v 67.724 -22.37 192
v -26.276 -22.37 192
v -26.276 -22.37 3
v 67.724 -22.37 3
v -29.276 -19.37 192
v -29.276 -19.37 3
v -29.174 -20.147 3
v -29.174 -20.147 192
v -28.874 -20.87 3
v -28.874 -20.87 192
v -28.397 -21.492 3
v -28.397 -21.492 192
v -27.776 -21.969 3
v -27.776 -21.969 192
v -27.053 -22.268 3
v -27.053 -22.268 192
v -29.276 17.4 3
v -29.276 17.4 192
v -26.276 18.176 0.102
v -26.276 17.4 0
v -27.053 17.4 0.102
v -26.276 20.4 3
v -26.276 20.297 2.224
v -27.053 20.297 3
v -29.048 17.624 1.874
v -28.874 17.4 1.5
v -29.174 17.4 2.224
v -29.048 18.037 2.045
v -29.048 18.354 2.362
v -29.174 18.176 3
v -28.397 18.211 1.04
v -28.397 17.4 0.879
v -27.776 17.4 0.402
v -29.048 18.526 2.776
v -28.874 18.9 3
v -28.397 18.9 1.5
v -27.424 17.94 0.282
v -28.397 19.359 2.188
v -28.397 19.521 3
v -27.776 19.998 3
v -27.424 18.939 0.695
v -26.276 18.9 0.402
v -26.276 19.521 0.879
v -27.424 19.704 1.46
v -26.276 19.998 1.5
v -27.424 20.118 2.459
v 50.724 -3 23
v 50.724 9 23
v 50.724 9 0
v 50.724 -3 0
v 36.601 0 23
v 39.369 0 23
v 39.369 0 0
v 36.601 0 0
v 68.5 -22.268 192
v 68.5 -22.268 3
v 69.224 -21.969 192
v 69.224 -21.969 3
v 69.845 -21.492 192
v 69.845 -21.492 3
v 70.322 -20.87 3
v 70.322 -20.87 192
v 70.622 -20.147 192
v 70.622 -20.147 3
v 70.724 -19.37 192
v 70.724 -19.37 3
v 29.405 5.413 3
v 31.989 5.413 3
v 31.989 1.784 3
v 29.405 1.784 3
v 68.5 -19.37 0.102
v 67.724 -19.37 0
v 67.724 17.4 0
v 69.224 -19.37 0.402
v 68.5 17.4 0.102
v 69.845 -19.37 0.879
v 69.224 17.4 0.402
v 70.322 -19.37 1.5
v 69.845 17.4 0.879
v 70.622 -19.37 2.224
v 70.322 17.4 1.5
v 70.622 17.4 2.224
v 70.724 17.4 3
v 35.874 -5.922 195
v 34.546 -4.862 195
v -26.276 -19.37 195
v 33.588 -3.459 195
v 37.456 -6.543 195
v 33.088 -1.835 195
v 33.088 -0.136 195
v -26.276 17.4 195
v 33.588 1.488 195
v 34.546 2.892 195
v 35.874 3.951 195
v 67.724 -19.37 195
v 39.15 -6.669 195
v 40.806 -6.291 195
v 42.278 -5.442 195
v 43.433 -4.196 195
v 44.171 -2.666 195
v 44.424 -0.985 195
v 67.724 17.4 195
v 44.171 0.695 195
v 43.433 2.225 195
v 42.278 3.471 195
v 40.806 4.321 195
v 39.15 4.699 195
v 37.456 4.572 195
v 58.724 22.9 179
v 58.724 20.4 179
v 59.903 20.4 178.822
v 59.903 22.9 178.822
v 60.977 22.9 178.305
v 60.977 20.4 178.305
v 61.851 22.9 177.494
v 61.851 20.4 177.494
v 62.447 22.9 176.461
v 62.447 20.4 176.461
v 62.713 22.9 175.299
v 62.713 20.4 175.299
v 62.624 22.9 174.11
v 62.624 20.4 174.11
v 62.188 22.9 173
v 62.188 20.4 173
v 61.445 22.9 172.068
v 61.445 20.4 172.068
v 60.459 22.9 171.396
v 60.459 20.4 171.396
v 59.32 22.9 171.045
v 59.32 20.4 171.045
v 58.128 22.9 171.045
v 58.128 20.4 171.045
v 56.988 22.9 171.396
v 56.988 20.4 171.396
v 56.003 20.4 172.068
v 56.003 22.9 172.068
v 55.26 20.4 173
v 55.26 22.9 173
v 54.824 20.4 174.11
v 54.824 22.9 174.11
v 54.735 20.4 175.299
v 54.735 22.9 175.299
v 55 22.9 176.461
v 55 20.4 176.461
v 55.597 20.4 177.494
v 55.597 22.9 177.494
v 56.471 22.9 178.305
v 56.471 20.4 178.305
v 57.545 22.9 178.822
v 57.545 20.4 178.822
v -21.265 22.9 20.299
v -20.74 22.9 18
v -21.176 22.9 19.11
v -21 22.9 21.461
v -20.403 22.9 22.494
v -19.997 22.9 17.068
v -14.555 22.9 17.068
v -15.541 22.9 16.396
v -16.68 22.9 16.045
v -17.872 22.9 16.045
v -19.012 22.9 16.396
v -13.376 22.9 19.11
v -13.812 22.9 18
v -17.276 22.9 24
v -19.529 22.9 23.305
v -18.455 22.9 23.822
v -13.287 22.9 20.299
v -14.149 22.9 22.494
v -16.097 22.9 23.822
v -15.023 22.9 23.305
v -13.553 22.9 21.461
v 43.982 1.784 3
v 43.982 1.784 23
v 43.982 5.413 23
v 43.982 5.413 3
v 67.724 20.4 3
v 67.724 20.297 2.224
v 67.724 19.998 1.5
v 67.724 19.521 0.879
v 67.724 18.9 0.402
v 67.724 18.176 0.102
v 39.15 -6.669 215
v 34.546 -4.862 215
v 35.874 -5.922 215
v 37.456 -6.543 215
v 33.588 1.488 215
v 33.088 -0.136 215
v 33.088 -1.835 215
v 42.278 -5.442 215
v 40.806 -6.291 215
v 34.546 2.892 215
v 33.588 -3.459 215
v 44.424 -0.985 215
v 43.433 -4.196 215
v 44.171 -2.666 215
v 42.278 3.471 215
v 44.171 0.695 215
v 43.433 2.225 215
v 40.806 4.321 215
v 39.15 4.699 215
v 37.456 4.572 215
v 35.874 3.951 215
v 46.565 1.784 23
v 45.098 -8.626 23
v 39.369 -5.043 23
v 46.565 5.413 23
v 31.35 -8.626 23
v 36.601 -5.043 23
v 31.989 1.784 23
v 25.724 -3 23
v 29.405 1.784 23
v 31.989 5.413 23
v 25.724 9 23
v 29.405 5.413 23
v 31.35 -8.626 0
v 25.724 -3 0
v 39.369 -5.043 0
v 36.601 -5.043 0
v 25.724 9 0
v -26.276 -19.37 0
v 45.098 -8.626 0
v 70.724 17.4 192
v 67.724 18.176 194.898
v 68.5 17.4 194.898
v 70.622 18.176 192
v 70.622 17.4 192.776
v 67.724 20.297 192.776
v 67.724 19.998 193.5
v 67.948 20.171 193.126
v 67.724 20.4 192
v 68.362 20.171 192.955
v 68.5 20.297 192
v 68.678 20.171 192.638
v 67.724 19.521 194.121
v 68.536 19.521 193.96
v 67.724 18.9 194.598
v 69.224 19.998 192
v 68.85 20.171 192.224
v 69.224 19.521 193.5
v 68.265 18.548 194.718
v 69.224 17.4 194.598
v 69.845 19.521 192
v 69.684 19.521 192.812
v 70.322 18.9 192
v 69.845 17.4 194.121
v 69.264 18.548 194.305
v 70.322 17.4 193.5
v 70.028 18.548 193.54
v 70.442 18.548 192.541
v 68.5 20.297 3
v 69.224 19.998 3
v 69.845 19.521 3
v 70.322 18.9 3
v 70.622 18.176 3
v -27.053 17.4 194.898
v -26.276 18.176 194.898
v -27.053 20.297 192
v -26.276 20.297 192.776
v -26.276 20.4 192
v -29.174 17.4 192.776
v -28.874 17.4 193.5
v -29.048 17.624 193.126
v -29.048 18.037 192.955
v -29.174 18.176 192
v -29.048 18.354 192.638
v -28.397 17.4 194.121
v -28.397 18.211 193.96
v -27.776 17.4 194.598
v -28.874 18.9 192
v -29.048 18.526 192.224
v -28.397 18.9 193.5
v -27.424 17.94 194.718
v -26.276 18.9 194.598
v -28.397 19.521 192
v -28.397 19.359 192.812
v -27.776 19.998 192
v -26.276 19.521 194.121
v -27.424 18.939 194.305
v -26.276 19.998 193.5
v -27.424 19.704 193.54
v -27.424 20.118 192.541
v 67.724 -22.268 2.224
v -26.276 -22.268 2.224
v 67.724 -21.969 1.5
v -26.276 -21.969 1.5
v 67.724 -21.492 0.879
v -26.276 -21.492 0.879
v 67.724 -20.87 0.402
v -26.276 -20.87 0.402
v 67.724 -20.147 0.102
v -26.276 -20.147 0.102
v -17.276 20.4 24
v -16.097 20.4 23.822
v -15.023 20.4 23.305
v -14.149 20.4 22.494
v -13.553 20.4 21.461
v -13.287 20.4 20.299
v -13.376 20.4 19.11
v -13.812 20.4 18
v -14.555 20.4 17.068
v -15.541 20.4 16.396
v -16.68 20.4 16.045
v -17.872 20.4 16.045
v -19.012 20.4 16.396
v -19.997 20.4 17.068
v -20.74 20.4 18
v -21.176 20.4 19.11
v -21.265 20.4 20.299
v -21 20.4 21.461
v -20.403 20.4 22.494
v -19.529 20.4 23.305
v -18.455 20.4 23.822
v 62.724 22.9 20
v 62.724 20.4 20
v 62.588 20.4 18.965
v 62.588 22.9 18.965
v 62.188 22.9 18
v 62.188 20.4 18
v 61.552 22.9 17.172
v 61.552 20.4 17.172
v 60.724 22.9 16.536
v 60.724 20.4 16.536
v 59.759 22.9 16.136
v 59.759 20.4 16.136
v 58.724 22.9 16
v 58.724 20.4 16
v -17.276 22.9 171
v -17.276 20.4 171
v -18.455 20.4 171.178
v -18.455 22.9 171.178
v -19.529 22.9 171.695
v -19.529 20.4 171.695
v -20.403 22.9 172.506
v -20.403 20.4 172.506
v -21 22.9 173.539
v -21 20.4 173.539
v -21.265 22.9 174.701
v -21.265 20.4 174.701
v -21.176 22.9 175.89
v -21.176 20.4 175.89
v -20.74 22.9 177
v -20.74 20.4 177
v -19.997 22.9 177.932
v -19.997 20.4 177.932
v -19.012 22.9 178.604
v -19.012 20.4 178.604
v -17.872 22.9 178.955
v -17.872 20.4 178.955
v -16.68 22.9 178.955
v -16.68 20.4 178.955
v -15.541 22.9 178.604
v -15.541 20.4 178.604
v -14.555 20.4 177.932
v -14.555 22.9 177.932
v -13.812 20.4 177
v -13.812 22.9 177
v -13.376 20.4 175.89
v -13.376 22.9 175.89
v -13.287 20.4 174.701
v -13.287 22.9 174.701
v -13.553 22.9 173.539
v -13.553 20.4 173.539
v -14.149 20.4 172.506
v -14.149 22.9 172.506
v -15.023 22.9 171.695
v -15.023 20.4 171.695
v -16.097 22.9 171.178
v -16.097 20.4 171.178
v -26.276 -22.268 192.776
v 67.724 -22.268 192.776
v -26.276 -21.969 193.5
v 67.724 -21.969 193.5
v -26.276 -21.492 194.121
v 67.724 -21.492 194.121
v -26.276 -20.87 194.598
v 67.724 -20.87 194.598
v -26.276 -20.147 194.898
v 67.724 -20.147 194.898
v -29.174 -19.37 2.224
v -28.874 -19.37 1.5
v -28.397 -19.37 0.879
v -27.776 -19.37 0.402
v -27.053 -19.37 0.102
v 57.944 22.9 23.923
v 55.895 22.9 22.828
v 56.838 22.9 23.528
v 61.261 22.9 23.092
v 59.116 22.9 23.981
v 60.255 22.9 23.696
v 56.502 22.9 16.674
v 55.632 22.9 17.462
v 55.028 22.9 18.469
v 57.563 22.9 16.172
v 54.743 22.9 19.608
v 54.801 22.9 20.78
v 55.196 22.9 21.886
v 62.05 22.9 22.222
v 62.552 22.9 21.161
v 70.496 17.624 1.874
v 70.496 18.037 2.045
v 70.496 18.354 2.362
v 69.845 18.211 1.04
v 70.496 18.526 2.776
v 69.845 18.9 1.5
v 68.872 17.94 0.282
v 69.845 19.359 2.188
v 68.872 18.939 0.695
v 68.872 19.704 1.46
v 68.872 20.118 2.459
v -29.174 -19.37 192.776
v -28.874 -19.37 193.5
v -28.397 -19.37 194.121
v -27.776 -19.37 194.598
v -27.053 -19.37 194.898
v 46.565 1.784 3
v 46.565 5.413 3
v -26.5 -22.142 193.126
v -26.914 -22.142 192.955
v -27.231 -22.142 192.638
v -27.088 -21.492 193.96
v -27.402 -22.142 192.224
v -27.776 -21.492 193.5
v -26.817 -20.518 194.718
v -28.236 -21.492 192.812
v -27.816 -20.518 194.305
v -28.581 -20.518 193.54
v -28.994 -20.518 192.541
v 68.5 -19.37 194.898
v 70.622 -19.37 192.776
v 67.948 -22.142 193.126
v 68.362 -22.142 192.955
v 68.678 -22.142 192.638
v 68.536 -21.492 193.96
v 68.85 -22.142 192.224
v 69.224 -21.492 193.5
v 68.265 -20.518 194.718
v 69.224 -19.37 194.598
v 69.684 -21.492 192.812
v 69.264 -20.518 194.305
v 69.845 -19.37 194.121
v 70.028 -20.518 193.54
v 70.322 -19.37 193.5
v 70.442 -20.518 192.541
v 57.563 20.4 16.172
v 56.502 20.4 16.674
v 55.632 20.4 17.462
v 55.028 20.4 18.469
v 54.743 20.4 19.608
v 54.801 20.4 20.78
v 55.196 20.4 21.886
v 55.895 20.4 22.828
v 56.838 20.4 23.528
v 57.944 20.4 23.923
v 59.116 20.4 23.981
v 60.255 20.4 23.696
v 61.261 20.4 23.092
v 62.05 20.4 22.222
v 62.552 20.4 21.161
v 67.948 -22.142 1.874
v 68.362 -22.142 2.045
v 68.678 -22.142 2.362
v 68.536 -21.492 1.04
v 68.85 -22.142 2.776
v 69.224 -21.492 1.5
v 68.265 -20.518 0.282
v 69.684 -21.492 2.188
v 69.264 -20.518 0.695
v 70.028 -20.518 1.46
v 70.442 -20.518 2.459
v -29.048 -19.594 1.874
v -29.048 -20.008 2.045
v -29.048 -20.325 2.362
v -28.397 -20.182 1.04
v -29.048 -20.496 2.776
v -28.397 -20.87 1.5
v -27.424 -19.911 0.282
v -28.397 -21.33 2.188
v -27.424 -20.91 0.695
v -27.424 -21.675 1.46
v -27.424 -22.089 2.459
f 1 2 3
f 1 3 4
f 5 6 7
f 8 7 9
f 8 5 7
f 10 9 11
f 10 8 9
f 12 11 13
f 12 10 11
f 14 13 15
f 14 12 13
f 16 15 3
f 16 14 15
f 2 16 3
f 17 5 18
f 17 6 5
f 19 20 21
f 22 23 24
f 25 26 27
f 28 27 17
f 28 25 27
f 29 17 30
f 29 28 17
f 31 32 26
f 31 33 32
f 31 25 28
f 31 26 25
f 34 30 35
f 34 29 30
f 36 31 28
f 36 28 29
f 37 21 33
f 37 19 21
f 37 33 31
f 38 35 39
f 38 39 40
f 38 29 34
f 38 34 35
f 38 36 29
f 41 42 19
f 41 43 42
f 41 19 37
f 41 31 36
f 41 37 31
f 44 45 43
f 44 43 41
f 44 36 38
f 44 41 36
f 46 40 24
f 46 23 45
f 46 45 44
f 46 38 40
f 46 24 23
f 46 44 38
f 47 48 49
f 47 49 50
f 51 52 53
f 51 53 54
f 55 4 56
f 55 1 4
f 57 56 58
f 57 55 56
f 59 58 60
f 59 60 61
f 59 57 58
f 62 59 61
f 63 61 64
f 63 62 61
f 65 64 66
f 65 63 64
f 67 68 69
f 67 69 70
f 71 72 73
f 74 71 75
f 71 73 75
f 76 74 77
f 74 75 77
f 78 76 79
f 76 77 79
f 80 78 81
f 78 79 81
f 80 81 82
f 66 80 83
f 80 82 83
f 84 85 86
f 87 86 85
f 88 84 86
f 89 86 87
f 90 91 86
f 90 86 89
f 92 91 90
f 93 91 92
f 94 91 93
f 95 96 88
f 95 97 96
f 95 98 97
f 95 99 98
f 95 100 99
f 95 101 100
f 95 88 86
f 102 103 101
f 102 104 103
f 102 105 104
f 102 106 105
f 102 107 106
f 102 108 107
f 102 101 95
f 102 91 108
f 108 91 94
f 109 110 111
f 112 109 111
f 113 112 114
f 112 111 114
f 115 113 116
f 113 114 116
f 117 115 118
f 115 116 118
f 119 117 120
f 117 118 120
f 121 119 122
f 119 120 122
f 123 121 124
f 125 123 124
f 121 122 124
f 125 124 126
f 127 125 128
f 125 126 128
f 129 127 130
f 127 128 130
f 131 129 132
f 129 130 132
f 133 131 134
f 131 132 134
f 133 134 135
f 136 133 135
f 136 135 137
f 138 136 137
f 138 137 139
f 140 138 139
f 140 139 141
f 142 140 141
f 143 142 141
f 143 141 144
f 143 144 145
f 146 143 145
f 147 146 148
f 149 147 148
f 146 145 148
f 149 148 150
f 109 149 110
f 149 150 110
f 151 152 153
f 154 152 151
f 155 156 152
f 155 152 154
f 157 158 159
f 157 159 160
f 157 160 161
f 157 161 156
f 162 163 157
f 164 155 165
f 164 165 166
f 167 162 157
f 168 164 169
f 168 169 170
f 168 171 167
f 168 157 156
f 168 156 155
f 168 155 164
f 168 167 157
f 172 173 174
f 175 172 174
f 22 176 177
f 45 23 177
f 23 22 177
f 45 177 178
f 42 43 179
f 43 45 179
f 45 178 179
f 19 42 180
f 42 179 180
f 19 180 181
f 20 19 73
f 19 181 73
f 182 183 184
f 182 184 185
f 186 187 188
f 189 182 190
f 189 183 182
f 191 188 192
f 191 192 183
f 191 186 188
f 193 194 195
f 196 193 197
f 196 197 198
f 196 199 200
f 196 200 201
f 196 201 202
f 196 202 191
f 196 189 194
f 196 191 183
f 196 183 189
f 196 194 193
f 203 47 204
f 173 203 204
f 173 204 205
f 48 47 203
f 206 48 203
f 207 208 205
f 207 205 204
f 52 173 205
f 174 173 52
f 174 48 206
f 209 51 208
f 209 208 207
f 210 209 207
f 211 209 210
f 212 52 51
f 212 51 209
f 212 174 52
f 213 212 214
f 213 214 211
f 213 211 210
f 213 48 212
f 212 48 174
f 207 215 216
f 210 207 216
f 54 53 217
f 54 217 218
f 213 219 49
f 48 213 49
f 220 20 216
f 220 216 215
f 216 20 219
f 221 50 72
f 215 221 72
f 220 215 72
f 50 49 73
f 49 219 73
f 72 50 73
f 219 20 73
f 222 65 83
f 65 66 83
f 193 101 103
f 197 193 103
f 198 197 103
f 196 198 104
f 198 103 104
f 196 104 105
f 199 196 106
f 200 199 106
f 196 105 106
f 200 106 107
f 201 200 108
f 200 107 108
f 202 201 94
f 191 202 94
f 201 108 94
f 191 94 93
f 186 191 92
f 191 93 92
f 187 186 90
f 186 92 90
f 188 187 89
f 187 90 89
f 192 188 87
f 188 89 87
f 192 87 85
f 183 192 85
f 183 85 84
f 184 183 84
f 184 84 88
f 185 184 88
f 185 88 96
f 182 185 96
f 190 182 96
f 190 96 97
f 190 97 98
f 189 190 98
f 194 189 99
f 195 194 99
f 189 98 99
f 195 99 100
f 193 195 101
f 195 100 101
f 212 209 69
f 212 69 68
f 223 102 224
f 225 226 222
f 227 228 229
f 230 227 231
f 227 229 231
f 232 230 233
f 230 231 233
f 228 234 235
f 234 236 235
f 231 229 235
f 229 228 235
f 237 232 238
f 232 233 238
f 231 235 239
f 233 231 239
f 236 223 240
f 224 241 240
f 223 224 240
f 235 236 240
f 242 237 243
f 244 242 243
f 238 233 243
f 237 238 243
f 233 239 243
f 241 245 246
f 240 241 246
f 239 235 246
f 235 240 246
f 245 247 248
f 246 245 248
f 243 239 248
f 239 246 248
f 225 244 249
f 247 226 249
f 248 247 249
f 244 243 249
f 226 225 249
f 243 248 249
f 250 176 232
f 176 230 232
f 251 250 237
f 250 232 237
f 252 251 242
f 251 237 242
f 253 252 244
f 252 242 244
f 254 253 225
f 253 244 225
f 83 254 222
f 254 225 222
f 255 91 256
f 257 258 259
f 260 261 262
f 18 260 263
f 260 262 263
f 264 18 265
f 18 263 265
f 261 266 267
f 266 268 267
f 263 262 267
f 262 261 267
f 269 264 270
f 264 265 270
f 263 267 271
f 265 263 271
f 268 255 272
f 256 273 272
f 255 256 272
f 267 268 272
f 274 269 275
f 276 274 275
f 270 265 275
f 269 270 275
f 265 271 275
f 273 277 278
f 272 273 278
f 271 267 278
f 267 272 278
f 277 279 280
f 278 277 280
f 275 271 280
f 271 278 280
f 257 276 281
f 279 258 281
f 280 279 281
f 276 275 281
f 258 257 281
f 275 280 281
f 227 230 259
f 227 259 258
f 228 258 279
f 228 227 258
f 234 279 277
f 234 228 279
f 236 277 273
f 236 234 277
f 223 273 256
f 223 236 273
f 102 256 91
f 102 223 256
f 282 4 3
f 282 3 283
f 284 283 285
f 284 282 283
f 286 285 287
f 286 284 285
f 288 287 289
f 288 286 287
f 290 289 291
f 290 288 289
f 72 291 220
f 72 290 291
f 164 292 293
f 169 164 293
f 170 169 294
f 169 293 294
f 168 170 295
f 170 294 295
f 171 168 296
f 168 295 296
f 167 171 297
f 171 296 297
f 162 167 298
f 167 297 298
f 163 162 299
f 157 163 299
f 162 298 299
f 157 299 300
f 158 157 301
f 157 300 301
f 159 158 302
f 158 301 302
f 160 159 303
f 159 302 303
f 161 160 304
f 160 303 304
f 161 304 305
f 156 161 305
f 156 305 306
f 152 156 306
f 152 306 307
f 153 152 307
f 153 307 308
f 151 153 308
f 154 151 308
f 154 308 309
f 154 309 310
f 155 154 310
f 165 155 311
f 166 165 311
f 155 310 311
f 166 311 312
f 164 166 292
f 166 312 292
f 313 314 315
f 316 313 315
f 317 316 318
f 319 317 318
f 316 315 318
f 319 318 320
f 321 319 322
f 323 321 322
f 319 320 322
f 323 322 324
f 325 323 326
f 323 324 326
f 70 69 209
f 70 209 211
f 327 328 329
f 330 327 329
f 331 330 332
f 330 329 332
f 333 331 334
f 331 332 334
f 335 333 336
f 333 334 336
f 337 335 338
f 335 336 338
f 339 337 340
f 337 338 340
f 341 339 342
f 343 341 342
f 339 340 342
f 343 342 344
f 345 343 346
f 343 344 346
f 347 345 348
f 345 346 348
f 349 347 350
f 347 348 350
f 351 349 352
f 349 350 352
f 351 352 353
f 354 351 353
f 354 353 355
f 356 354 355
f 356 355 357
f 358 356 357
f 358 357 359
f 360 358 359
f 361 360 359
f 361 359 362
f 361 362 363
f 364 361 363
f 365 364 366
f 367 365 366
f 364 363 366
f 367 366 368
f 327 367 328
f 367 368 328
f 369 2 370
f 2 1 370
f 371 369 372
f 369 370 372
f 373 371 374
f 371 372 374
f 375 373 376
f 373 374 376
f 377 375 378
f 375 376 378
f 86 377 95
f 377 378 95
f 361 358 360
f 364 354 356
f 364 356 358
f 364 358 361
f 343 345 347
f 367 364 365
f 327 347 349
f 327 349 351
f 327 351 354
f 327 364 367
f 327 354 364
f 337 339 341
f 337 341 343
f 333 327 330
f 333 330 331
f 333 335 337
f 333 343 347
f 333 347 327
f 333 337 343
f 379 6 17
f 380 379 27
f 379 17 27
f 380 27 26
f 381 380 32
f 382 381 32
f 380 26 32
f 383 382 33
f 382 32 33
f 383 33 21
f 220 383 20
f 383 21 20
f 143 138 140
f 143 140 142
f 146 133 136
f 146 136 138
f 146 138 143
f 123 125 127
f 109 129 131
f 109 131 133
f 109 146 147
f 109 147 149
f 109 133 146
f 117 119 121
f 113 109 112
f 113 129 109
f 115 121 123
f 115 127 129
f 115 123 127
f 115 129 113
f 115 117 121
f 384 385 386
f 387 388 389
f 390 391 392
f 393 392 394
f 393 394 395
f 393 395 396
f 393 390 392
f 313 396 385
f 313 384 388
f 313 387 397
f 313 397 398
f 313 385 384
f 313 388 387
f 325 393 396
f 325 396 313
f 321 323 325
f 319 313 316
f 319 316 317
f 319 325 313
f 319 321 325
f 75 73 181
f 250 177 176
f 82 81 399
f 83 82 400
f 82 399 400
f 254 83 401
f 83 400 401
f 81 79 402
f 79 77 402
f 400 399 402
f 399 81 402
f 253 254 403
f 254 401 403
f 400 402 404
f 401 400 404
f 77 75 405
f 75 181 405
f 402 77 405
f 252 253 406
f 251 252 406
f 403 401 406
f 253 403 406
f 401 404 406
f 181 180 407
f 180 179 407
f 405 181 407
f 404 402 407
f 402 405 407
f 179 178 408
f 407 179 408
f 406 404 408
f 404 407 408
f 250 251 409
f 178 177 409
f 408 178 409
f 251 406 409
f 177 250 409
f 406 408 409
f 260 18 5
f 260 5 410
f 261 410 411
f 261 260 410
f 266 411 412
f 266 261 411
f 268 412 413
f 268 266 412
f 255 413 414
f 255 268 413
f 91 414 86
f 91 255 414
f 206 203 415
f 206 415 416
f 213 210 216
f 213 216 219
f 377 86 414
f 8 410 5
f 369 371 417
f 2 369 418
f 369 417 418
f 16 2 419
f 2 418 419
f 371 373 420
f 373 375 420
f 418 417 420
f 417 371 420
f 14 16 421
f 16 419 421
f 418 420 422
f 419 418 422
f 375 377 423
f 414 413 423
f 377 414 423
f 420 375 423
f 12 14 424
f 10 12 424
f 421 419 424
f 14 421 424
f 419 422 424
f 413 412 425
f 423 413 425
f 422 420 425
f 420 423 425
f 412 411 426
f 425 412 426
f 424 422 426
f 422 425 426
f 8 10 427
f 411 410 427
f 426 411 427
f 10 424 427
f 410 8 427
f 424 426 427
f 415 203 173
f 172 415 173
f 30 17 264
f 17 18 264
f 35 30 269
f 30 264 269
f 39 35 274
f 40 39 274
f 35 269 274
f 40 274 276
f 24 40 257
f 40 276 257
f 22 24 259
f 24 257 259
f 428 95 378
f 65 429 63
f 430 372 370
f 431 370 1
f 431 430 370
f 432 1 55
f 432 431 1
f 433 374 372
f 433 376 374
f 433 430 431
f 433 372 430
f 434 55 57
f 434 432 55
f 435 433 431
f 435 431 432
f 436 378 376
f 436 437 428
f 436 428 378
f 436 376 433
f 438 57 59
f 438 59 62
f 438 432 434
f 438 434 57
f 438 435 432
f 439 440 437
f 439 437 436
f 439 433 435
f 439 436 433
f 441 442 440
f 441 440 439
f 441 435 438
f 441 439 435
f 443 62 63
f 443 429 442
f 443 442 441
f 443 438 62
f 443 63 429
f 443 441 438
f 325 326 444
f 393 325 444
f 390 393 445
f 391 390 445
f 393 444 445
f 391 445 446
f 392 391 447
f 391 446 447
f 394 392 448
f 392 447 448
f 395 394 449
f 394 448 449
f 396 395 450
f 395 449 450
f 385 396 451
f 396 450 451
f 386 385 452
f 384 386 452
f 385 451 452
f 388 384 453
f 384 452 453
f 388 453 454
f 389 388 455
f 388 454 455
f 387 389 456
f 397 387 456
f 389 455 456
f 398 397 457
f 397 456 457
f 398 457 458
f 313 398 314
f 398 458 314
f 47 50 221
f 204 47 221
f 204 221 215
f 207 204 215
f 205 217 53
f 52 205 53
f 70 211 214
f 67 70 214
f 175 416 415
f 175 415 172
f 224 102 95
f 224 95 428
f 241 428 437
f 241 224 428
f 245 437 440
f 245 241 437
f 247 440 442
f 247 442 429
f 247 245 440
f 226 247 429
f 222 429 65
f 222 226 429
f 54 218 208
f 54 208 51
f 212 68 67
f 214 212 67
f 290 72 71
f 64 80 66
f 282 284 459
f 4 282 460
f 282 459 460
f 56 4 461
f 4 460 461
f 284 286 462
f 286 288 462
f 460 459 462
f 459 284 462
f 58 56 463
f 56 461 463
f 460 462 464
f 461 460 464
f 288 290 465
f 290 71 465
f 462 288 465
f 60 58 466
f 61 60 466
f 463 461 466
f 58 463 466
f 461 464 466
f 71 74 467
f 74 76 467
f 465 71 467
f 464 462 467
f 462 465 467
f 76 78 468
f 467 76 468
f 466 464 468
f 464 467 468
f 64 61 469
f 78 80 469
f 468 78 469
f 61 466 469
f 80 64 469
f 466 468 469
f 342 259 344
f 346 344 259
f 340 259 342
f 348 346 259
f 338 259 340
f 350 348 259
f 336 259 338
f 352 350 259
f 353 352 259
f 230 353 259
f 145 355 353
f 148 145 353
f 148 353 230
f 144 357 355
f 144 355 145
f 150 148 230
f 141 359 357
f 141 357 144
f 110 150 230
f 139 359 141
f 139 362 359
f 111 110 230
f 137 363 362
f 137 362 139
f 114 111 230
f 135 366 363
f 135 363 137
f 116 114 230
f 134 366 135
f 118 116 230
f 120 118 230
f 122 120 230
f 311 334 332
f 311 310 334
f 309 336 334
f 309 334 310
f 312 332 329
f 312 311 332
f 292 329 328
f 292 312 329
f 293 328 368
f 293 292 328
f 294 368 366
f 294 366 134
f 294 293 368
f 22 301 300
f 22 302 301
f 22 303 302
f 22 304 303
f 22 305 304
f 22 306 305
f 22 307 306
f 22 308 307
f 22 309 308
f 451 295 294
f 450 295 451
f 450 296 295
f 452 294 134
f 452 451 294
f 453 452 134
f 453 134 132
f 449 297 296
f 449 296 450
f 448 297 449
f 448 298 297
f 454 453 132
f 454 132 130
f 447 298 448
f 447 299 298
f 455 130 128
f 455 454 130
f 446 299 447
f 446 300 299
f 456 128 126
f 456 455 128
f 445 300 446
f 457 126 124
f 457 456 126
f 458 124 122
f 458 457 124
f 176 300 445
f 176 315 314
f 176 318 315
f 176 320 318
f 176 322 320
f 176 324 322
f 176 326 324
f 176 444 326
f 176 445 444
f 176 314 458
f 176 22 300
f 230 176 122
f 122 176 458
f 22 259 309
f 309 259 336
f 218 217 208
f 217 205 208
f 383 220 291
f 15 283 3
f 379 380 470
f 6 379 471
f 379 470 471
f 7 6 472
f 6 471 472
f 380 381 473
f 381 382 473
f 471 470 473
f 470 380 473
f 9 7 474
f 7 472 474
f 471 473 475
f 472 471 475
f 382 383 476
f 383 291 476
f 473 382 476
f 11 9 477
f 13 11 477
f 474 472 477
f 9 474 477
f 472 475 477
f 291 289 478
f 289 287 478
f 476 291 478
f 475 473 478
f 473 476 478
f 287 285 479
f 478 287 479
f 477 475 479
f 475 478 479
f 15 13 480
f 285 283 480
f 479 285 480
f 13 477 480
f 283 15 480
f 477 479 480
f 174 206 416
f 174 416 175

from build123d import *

# Parameters (mm, degrees)
SKETCH1_W           = 100
SKETCH1_H           = 42.77
BOSS_EXTRUDE1_DEPTH = 195
SKETCH2_R           = 4
BOSS_EXTRUDE2_DEPTH = 2.5
FILLET1_R           = 3
SKETCH3_R           = 5.7
BOSS_EXTRUDE3_DEPTH = 20
CUT_EXTRUDE1_DEPTH  = 23
SKETCH5_W           = 2.767644168
SKETCH5_H           = 5.042715582
SKETCH5_W_2         = 2.583134557
SKETCH5_H_2         = 3.628689021
BOSS_EXTRUDE4_DEPTH = 20
SKETCH6_W           = 2.767644168
SKETCH6_H           = 5.042715582
BOSS_EXTRUDE5_DEPTH = 3


with BuildPart() as part:
    # Sketch1 → Boss-Extrude1 (new body)
    with BuildSketch(Plane.XY):
        with Locations((20.723910559, -0.985431434)):
            Rectangle(SKETCH1_W, SKETCH1_H)
    extrude(amount=BOSS_EXTRUDE1_DEPTH)

    # Sketch2 → Boss-Extrude2 (add)
    with BuildSketch(Plane(origin=(0, 20.399568566, 0), x_dir=(1, 0, 0), z_dir=(0, 1, 0))):
        with BuildLine():
            ThreePointArc((62.723910559, -20), (61.552337684, -17.171572875), (58.723910559, -16))
            Line((58.723910559, -16), (58.723910559, -20))
            Line((58.723910559, -20), (62.723910559, -20))
        make_face()
        with BuildLine():
            Line((58.723910559, -20), (58.723910559, -16))
            ThreePointArc((58.723910559, -16), (55.895483435, -22.828427125), (62.723910559, -20))
            Line((62.723910559, -20), (58.723910559, -20))
        make_face()
        with Locations(Location((-17.276089441, -20, 0), (0, 0, 270))):
            Circle(SKETCH2_R)
        with Locations(Location((-17.276089441, -175, 0), (0, 0, 90))):
            Circle(SKETCH2_R)
        with Locations(Location((58.723910559, -175, 0), (0, 0, 270))):
            Circle(SKETCH2_R)
    extrude(amount=BOSS_EXTRUDE2_DEPTH)

    # Fillet1
    fillet1_edges = [part.edges().sort_by_distance(p)[0] for p in [
        (70.723910559, -0.985431434, 195),
        (20.723910559, 20.399568566, 195),
        (-29.276089441, -0.985431434, 195),
        (20.723910559, 20.399568566, 0),
        (70.723910559, -0.985431434, 0),
        (20.723910559, -22.370431434, 0),
        (-29.276089441, -0.985431434, 0),
        (20.723910559, -22.370431434, 195),
        (-29.276089441, 20.399568566, 97.5),
        (70.723910559, 20.399568566, 97.5),
        (70.723910559, -22.370431434, 97.5),
        (-29.276089441, -22.370431434, 97.5),
    ]]
    fillet(fillet1_edges, radius=FILLET1_R)

    # Sketch3 → Boss-Extrude3 (add)
    with BuildSketch(Plane.XY.offset(195)):
        with Locations((38.723910559, -0.985431434)):
            Circle(SKETCH3_R)
    extrude(amount=BOSS_EXTRUDE3_DEPTH)

    # Sketch4 → Cut-Extrude1 (cut)
    with BuildSketch(Plane(origin=(0, 0, 0), x_dir=(-1, 0, 0), z_dir=(0, 0, -1))):
        Polygon((-50.723910559, 0), (-50.723910559, -3), (-45.097599839, -8.62631072), (-31.35022128, -8.62631072), (-25.723910559, -3), (-25.723910559, 9), (-50.723910559, 9), align=None)
    extrude(amount=-CUT_EXTRUDE1_DEPTH, mode=Mode.SUBTRACT)

    # Sketch5 → Boss-Extrude4 (add)
    with BuildSketch(Plane(origin=(0, 0, 23), x_dir=(-1, 0, 0), z_dir=(0, 0, -1))):
        with Locations((-37.98516428, -2.521357791)):
            Rectangle(SKETCH5_W, SKETCH5_H)
        with Locations((-45.273293924, 3.598484544)):
            Rectangle(SKETCH5_W_2, SKETCH5_H_2)
        with Locations((-30.697034638, 3.598484544)):
            Rectangle(SKETCH5_W_2, SKETCH5_H_2)
    extrude(amount=BOSS_EXTRUDE4_DEPTH)

    # Sketch6 → Boss-Extrude5 (add)
    with BuildSketch(Plane(origin=(0, 0, 3), x_dir=(-1, 0, 0), z_dir=(0, 0, -1))):
        with Locations((-37.98516428, -2.521357791)):
            Rectangle(SKETCH6_W, SKETCH6_H)
    extrude(amount=BOSS_EXTRUDE5_DEPTH)


solid = part.part
